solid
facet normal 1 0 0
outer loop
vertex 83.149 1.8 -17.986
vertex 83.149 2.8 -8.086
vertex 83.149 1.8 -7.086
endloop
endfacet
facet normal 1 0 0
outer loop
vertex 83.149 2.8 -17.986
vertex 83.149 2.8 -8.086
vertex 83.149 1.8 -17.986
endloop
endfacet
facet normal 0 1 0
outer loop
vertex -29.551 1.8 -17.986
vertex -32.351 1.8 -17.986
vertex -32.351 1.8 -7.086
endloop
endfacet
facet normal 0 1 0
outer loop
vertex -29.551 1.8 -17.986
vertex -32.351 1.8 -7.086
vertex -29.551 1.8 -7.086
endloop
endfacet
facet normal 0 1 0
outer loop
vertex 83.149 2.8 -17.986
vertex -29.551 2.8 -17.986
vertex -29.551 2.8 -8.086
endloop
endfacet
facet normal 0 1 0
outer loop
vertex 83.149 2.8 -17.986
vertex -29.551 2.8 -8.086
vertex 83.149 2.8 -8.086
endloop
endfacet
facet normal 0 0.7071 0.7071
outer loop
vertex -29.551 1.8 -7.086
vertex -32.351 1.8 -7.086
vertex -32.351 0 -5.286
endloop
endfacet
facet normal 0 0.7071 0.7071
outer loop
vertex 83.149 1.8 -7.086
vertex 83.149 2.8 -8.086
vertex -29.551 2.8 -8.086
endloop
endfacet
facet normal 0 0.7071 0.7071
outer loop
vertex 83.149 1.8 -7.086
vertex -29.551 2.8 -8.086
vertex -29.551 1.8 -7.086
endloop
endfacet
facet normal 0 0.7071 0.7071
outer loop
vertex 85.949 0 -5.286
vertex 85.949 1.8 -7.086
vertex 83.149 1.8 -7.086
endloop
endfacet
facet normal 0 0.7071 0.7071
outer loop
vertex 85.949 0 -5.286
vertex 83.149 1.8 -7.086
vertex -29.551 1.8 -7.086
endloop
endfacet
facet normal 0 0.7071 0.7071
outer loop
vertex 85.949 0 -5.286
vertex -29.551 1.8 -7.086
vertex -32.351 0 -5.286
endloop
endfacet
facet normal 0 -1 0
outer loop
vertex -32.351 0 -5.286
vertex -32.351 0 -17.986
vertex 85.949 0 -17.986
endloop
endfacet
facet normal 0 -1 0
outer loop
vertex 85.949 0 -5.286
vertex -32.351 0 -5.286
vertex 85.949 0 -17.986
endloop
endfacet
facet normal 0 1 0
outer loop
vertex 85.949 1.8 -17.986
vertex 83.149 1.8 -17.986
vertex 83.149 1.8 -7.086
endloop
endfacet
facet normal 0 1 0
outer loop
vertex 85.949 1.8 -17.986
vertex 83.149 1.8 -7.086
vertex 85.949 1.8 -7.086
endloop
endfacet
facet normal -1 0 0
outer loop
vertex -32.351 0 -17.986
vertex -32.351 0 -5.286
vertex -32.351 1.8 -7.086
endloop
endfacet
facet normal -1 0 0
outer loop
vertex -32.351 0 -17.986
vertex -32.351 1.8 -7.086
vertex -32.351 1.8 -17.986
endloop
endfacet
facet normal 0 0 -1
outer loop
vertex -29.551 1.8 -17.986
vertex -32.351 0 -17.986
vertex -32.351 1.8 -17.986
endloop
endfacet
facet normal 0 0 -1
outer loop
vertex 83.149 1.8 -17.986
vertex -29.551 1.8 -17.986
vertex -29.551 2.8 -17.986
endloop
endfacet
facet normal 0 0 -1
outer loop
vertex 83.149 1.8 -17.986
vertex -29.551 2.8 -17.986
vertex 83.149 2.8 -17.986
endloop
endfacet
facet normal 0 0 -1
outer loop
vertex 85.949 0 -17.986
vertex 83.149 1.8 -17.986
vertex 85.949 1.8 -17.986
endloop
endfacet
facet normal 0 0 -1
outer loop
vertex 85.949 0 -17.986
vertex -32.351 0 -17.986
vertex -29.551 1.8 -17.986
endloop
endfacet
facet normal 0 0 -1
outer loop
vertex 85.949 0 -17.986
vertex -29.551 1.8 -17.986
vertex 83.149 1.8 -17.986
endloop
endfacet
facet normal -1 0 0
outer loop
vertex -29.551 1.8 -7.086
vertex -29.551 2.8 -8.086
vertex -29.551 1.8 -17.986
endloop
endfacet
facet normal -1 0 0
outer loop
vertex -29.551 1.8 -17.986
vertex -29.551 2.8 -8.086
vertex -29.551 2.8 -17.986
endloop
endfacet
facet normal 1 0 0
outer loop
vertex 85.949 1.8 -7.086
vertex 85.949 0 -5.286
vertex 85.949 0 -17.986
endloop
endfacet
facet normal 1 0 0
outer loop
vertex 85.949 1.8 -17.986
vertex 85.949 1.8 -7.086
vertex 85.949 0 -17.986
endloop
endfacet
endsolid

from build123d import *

# Parameters (mm, degrees)
SKETCH_1_W          = 118.3
SKETCH_1_H          = 12.7
EXTRUDE_1_DEPTH     = 2.8
SKETCH_2_W          = 2.8
SKETCH_2_H          = 12.7
CUT_EXTRUDE_1_DEPTH = 1
CUT_EXTRUDE_2_DEPTH = 120.692278835


with BuildPart() as part:
    # 草图1 → 凸台-拉伸1 (new body)
    with BuildSketch(Plane(origin=(0, 0, 0), x_dir=(1, 0, 0), z_dir=(0, 1, 0))):
        with Locations((26.798571429, 11.636428571)):
            Rectangle(SKETCH_1_W, SKETCH_1_H)
    extrude(amount=EXTRUDE_1_DEPTH)

    # 草图2 → 切除-拉伸1 (cut)
    with BuildSketch(Plane(origin=(0, 2.8, 0), x_dir=(1, 0, 0), z_dir=(0, 1, 0))):
        with Locations((-30.951428571, 11.636428571)):
            Rectangle(SKETCH_2_W, SKETCH_2_H)
        with Locations((84.548571429, 11.636428571)):
            Rectangle(SKETCH_2_W, SKETCH_2_H)
    extrude(amount=-CUT_EXTRUDE_1_DEPTH, mode=Mode.SUBTRACT)

    # 草图3 → 切除-拉伸2 (cut, through all)
    with BuildSketch(Plane(origin=(85.948571429, 0, 0), x_dir=(0, 0, -1), z_dir=(1, 0, 0))):
        Polygon((5.286428571, 0), (5.286428571, 2.8), (8.086428571, 2.8), align=None)
    extrude(amount=-CUT_EXTRUDE_2_DEPTH, mode=Mode.SUBTRACT)


solid = part.part
